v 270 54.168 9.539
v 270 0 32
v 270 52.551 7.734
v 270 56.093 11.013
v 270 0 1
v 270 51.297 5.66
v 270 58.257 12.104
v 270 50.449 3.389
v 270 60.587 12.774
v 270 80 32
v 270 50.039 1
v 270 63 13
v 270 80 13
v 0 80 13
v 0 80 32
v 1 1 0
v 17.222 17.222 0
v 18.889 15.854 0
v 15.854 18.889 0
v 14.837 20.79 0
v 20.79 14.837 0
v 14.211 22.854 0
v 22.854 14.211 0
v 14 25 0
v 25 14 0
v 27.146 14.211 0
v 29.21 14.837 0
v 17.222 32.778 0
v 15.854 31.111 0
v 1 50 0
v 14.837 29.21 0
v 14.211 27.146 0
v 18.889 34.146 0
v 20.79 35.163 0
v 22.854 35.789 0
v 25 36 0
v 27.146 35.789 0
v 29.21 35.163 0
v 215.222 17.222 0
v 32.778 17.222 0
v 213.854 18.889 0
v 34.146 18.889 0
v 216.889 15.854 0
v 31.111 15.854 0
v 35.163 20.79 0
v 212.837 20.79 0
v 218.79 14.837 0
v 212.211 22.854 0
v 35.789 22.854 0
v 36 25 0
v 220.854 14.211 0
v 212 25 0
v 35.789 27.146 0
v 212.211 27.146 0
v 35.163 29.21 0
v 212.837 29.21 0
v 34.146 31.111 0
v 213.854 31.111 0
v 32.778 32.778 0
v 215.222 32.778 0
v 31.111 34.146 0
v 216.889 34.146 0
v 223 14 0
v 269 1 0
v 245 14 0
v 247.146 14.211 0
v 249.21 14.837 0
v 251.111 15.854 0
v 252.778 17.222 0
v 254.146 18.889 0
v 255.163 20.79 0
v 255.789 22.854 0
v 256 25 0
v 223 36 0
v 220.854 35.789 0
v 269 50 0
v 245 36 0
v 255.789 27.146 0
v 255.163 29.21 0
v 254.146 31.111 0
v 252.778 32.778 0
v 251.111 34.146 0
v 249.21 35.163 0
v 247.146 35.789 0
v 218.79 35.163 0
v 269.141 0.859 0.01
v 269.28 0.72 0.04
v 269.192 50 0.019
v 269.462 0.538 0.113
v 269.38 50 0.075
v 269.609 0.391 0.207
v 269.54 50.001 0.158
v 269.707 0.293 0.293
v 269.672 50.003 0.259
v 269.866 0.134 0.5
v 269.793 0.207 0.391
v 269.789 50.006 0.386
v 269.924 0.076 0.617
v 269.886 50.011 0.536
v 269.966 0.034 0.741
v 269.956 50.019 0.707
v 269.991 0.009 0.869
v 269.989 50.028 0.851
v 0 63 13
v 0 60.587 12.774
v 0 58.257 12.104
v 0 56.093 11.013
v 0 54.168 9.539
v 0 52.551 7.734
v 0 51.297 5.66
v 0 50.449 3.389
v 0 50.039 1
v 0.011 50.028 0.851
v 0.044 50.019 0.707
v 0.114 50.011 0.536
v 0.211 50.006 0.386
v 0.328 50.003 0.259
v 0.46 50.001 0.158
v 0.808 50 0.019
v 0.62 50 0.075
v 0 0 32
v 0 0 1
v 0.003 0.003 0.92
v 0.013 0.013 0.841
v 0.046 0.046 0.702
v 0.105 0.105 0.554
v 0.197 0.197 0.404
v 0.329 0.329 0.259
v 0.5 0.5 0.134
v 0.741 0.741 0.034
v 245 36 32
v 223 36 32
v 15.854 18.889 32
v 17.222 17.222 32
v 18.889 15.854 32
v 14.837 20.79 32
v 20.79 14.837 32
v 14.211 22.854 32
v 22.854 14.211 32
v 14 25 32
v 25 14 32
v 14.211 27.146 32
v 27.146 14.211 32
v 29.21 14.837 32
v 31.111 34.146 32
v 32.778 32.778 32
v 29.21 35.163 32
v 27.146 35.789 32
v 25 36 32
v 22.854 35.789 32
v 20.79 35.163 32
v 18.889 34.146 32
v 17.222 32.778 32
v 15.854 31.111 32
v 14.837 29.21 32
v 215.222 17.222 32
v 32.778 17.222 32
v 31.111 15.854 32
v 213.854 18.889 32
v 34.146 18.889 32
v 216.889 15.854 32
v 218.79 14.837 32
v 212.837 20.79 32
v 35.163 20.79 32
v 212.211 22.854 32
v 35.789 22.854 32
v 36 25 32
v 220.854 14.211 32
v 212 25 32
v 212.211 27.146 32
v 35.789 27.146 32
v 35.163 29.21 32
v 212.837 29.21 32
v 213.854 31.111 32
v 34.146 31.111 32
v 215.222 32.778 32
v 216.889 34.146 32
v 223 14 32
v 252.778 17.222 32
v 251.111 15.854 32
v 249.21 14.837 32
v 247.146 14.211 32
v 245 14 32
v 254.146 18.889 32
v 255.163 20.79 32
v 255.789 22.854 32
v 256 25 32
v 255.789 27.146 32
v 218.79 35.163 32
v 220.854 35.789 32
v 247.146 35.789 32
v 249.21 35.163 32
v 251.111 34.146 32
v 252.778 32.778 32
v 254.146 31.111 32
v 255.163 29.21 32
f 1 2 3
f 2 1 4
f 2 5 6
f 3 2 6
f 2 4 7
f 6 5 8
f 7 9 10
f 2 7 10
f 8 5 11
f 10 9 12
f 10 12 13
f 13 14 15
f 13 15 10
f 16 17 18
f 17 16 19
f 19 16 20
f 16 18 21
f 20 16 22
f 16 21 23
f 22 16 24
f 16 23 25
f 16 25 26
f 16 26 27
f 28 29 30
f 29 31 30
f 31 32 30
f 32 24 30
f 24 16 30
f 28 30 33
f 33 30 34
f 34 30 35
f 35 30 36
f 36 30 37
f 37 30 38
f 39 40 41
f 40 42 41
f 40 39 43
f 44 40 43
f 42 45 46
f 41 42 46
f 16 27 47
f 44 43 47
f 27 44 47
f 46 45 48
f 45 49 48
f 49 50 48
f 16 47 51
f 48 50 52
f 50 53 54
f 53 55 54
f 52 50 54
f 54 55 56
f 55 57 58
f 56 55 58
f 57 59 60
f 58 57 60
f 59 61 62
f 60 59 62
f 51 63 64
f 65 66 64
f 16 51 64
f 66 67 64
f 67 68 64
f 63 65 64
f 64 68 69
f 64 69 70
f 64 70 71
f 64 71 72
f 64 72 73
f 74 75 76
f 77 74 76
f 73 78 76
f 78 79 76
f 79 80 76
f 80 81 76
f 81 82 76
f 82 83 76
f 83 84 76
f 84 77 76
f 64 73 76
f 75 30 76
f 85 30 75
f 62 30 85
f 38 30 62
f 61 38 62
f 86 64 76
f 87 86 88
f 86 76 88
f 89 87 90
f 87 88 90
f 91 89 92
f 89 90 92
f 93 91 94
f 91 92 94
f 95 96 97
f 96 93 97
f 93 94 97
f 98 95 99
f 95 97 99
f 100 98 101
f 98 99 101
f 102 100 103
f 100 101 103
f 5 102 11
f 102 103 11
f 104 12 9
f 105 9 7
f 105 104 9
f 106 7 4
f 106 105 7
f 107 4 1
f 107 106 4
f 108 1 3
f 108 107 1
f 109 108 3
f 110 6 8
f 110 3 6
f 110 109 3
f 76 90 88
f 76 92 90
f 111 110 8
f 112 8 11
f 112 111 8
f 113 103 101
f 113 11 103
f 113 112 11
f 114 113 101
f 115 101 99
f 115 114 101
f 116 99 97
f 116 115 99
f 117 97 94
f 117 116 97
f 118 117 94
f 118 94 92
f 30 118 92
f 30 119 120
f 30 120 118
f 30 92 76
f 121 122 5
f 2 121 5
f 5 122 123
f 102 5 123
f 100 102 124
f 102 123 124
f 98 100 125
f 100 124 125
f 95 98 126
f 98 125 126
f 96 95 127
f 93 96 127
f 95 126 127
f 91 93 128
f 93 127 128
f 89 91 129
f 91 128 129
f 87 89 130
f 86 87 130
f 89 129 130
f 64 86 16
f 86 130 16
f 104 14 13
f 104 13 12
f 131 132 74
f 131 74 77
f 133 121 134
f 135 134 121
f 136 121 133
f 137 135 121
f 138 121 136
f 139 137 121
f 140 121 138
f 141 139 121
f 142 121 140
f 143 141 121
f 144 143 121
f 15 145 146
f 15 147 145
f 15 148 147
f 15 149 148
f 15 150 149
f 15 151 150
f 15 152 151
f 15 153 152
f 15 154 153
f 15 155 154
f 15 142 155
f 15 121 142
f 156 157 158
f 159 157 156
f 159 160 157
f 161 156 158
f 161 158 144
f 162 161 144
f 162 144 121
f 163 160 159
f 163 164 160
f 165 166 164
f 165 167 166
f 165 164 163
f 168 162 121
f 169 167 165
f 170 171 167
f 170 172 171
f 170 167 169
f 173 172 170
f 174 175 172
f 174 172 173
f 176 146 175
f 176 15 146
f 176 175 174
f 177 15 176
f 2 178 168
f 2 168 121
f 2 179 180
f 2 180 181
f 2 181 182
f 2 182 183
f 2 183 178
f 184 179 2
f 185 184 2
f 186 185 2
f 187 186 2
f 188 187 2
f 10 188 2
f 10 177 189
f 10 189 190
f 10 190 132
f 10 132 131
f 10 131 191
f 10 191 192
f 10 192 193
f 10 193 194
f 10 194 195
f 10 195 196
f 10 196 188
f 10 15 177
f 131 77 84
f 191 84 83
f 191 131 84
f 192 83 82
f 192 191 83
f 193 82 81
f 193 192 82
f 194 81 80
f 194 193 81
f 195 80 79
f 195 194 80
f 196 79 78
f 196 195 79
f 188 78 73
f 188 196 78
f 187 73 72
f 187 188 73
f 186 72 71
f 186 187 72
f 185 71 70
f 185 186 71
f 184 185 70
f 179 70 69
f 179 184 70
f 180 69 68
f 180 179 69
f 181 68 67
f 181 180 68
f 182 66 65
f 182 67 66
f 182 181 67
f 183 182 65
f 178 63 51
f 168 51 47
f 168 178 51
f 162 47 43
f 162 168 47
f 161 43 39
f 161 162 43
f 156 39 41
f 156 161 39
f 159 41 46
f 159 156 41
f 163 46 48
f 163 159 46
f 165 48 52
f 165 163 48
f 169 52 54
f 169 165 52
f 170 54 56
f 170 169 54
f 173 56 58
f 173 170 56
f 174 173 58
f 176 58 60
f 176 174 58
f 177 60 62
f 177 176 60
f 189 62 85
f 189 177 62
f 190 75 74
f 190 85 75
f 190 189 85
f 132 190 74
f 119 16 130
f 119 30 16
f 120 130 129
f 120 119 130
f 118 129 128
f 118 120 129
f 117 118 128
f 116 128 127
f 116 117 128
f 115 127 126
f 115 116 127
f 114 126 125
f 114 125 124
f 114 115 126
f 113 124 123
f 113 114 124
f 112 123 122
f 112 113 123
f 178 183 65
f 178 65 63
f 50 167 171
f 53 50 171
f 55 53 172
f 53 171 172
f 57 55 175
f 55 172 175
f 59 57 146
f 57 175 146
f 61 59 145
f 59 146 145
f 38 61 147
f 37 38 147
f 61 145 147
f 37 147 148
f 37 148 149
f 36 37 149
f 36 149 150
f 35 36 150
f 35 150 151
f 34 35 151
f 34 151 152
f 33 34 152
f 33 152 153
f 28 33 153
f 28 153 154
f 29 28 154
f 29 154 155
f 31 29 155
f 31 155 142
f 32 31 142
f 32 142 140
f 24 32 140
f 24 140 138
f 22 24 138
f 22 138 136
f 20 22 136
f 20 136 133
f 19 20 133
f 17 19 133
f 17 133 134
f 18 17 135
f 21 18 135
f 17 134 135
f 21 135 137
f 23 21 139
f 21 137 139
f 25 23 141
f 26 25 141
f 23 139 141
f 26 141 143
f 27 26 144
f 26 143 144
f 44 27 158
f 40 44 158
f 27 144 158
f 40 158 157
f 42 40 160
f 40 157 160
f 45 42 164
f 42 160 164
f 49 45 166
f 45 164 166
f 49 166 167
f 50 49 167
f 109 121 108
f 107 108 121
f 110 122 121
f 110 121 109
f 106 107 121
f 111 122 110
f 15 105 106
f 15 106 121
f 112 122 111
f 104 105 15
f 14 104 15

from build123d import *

# Parameters (mm, degrees)
SKETCH_1_W          = 270
SKETCH_1_H          = 80
EXTRUDE_1_DEPTH     = 32
SKETCH_2_R          = 11
CUT_EXTRUDE_1_DEPTH = 284.414890223
CUT_EXTRUDE_2_DEPTH = 284.414890223
FILLET_1_R          = 1
FILLET_2_R          = 1
FILLET_4_R          = 1


with BuildPart() as part:
    # 草图1 → 拉伸1 (new body)
    with BuildSketch(Plane.XY):
        with Locations((135, 40)):
            Rectangle(SKETCH_1_W, SKETCH_1_H)
    extrude(amount=EXTRUDE_1_DEPTH)

    # 草图2 → 切除-拉伸1 (cut, through all)
    with BuildSketch(Plane.XY.offset(32)):
        with Locations((25, 25)):
            Circle(SKETCH_2_R)
        with BuildLine():
            Line((223, 36), (245, 36))
            ThreePointArc((245, 36), (256, 25), (245, 14))
            Line((245, 14), (223, 14))
            ThreePointArc((223, 14), (212, 25), (223, 36))
        make_face()
    extrude(amount=-CUT_EXTRUDE_1_DEPTH, mode=Mode.SUBTRACT)

    # 草图3 → 切除-拉伸2 (cut, through all)
    with BuildSketch(Plane.ZY):
        with BuildLine():
            Line((13, 80), (13, 63))
            ThreePointArc((13, 63), (9.192388155, 53.807611845), (0, 50))
            Line((0, 50), (0, 80))
            Line((0, 80), (13, 80))
        make_face()
    extrude(amount=-CUT_EXTRUDE_2_DEPTH, mode=Mode.SUBTRACT)

    # 圆角1
    fillet_1_edges = [part.edges().sort_by_distance(p)[0] for p in [
        (270, 25, 0),
    ]]
    fillet(fillet_1_edges, radius=FILLET_1_R)

    # 圆角2
    fillet_2_edges = [part.edges().sort_by_distance(p)[0] for p in [
        (0, 25, 0),
    ]]
    fillet(fillet_2_edges, radius=FILLET_2_R)

    # 圆角4
    # the kernel refuses this fillet: 1 mm, written as the material it takes off along each edge
    with BuildSketch(Plane(origin=(-1.5, 0, 0), x_dir=(0, 0, 1), z_dir=(1, 0, 0))) as fillet_4_piece_1:
        with BuildLine():
            CenterArc((FILLET_4_R, -FILLET_4_R), FILLET_4_R, 90, 90)
            Line((0, -FILLET_4_R), (0, 0))
            Line((0, 0), (FILLET_4_R, 0))
        make_face()
    extrude(amount=273, mode=Mode.SUBTRACT)


solid = part.part
